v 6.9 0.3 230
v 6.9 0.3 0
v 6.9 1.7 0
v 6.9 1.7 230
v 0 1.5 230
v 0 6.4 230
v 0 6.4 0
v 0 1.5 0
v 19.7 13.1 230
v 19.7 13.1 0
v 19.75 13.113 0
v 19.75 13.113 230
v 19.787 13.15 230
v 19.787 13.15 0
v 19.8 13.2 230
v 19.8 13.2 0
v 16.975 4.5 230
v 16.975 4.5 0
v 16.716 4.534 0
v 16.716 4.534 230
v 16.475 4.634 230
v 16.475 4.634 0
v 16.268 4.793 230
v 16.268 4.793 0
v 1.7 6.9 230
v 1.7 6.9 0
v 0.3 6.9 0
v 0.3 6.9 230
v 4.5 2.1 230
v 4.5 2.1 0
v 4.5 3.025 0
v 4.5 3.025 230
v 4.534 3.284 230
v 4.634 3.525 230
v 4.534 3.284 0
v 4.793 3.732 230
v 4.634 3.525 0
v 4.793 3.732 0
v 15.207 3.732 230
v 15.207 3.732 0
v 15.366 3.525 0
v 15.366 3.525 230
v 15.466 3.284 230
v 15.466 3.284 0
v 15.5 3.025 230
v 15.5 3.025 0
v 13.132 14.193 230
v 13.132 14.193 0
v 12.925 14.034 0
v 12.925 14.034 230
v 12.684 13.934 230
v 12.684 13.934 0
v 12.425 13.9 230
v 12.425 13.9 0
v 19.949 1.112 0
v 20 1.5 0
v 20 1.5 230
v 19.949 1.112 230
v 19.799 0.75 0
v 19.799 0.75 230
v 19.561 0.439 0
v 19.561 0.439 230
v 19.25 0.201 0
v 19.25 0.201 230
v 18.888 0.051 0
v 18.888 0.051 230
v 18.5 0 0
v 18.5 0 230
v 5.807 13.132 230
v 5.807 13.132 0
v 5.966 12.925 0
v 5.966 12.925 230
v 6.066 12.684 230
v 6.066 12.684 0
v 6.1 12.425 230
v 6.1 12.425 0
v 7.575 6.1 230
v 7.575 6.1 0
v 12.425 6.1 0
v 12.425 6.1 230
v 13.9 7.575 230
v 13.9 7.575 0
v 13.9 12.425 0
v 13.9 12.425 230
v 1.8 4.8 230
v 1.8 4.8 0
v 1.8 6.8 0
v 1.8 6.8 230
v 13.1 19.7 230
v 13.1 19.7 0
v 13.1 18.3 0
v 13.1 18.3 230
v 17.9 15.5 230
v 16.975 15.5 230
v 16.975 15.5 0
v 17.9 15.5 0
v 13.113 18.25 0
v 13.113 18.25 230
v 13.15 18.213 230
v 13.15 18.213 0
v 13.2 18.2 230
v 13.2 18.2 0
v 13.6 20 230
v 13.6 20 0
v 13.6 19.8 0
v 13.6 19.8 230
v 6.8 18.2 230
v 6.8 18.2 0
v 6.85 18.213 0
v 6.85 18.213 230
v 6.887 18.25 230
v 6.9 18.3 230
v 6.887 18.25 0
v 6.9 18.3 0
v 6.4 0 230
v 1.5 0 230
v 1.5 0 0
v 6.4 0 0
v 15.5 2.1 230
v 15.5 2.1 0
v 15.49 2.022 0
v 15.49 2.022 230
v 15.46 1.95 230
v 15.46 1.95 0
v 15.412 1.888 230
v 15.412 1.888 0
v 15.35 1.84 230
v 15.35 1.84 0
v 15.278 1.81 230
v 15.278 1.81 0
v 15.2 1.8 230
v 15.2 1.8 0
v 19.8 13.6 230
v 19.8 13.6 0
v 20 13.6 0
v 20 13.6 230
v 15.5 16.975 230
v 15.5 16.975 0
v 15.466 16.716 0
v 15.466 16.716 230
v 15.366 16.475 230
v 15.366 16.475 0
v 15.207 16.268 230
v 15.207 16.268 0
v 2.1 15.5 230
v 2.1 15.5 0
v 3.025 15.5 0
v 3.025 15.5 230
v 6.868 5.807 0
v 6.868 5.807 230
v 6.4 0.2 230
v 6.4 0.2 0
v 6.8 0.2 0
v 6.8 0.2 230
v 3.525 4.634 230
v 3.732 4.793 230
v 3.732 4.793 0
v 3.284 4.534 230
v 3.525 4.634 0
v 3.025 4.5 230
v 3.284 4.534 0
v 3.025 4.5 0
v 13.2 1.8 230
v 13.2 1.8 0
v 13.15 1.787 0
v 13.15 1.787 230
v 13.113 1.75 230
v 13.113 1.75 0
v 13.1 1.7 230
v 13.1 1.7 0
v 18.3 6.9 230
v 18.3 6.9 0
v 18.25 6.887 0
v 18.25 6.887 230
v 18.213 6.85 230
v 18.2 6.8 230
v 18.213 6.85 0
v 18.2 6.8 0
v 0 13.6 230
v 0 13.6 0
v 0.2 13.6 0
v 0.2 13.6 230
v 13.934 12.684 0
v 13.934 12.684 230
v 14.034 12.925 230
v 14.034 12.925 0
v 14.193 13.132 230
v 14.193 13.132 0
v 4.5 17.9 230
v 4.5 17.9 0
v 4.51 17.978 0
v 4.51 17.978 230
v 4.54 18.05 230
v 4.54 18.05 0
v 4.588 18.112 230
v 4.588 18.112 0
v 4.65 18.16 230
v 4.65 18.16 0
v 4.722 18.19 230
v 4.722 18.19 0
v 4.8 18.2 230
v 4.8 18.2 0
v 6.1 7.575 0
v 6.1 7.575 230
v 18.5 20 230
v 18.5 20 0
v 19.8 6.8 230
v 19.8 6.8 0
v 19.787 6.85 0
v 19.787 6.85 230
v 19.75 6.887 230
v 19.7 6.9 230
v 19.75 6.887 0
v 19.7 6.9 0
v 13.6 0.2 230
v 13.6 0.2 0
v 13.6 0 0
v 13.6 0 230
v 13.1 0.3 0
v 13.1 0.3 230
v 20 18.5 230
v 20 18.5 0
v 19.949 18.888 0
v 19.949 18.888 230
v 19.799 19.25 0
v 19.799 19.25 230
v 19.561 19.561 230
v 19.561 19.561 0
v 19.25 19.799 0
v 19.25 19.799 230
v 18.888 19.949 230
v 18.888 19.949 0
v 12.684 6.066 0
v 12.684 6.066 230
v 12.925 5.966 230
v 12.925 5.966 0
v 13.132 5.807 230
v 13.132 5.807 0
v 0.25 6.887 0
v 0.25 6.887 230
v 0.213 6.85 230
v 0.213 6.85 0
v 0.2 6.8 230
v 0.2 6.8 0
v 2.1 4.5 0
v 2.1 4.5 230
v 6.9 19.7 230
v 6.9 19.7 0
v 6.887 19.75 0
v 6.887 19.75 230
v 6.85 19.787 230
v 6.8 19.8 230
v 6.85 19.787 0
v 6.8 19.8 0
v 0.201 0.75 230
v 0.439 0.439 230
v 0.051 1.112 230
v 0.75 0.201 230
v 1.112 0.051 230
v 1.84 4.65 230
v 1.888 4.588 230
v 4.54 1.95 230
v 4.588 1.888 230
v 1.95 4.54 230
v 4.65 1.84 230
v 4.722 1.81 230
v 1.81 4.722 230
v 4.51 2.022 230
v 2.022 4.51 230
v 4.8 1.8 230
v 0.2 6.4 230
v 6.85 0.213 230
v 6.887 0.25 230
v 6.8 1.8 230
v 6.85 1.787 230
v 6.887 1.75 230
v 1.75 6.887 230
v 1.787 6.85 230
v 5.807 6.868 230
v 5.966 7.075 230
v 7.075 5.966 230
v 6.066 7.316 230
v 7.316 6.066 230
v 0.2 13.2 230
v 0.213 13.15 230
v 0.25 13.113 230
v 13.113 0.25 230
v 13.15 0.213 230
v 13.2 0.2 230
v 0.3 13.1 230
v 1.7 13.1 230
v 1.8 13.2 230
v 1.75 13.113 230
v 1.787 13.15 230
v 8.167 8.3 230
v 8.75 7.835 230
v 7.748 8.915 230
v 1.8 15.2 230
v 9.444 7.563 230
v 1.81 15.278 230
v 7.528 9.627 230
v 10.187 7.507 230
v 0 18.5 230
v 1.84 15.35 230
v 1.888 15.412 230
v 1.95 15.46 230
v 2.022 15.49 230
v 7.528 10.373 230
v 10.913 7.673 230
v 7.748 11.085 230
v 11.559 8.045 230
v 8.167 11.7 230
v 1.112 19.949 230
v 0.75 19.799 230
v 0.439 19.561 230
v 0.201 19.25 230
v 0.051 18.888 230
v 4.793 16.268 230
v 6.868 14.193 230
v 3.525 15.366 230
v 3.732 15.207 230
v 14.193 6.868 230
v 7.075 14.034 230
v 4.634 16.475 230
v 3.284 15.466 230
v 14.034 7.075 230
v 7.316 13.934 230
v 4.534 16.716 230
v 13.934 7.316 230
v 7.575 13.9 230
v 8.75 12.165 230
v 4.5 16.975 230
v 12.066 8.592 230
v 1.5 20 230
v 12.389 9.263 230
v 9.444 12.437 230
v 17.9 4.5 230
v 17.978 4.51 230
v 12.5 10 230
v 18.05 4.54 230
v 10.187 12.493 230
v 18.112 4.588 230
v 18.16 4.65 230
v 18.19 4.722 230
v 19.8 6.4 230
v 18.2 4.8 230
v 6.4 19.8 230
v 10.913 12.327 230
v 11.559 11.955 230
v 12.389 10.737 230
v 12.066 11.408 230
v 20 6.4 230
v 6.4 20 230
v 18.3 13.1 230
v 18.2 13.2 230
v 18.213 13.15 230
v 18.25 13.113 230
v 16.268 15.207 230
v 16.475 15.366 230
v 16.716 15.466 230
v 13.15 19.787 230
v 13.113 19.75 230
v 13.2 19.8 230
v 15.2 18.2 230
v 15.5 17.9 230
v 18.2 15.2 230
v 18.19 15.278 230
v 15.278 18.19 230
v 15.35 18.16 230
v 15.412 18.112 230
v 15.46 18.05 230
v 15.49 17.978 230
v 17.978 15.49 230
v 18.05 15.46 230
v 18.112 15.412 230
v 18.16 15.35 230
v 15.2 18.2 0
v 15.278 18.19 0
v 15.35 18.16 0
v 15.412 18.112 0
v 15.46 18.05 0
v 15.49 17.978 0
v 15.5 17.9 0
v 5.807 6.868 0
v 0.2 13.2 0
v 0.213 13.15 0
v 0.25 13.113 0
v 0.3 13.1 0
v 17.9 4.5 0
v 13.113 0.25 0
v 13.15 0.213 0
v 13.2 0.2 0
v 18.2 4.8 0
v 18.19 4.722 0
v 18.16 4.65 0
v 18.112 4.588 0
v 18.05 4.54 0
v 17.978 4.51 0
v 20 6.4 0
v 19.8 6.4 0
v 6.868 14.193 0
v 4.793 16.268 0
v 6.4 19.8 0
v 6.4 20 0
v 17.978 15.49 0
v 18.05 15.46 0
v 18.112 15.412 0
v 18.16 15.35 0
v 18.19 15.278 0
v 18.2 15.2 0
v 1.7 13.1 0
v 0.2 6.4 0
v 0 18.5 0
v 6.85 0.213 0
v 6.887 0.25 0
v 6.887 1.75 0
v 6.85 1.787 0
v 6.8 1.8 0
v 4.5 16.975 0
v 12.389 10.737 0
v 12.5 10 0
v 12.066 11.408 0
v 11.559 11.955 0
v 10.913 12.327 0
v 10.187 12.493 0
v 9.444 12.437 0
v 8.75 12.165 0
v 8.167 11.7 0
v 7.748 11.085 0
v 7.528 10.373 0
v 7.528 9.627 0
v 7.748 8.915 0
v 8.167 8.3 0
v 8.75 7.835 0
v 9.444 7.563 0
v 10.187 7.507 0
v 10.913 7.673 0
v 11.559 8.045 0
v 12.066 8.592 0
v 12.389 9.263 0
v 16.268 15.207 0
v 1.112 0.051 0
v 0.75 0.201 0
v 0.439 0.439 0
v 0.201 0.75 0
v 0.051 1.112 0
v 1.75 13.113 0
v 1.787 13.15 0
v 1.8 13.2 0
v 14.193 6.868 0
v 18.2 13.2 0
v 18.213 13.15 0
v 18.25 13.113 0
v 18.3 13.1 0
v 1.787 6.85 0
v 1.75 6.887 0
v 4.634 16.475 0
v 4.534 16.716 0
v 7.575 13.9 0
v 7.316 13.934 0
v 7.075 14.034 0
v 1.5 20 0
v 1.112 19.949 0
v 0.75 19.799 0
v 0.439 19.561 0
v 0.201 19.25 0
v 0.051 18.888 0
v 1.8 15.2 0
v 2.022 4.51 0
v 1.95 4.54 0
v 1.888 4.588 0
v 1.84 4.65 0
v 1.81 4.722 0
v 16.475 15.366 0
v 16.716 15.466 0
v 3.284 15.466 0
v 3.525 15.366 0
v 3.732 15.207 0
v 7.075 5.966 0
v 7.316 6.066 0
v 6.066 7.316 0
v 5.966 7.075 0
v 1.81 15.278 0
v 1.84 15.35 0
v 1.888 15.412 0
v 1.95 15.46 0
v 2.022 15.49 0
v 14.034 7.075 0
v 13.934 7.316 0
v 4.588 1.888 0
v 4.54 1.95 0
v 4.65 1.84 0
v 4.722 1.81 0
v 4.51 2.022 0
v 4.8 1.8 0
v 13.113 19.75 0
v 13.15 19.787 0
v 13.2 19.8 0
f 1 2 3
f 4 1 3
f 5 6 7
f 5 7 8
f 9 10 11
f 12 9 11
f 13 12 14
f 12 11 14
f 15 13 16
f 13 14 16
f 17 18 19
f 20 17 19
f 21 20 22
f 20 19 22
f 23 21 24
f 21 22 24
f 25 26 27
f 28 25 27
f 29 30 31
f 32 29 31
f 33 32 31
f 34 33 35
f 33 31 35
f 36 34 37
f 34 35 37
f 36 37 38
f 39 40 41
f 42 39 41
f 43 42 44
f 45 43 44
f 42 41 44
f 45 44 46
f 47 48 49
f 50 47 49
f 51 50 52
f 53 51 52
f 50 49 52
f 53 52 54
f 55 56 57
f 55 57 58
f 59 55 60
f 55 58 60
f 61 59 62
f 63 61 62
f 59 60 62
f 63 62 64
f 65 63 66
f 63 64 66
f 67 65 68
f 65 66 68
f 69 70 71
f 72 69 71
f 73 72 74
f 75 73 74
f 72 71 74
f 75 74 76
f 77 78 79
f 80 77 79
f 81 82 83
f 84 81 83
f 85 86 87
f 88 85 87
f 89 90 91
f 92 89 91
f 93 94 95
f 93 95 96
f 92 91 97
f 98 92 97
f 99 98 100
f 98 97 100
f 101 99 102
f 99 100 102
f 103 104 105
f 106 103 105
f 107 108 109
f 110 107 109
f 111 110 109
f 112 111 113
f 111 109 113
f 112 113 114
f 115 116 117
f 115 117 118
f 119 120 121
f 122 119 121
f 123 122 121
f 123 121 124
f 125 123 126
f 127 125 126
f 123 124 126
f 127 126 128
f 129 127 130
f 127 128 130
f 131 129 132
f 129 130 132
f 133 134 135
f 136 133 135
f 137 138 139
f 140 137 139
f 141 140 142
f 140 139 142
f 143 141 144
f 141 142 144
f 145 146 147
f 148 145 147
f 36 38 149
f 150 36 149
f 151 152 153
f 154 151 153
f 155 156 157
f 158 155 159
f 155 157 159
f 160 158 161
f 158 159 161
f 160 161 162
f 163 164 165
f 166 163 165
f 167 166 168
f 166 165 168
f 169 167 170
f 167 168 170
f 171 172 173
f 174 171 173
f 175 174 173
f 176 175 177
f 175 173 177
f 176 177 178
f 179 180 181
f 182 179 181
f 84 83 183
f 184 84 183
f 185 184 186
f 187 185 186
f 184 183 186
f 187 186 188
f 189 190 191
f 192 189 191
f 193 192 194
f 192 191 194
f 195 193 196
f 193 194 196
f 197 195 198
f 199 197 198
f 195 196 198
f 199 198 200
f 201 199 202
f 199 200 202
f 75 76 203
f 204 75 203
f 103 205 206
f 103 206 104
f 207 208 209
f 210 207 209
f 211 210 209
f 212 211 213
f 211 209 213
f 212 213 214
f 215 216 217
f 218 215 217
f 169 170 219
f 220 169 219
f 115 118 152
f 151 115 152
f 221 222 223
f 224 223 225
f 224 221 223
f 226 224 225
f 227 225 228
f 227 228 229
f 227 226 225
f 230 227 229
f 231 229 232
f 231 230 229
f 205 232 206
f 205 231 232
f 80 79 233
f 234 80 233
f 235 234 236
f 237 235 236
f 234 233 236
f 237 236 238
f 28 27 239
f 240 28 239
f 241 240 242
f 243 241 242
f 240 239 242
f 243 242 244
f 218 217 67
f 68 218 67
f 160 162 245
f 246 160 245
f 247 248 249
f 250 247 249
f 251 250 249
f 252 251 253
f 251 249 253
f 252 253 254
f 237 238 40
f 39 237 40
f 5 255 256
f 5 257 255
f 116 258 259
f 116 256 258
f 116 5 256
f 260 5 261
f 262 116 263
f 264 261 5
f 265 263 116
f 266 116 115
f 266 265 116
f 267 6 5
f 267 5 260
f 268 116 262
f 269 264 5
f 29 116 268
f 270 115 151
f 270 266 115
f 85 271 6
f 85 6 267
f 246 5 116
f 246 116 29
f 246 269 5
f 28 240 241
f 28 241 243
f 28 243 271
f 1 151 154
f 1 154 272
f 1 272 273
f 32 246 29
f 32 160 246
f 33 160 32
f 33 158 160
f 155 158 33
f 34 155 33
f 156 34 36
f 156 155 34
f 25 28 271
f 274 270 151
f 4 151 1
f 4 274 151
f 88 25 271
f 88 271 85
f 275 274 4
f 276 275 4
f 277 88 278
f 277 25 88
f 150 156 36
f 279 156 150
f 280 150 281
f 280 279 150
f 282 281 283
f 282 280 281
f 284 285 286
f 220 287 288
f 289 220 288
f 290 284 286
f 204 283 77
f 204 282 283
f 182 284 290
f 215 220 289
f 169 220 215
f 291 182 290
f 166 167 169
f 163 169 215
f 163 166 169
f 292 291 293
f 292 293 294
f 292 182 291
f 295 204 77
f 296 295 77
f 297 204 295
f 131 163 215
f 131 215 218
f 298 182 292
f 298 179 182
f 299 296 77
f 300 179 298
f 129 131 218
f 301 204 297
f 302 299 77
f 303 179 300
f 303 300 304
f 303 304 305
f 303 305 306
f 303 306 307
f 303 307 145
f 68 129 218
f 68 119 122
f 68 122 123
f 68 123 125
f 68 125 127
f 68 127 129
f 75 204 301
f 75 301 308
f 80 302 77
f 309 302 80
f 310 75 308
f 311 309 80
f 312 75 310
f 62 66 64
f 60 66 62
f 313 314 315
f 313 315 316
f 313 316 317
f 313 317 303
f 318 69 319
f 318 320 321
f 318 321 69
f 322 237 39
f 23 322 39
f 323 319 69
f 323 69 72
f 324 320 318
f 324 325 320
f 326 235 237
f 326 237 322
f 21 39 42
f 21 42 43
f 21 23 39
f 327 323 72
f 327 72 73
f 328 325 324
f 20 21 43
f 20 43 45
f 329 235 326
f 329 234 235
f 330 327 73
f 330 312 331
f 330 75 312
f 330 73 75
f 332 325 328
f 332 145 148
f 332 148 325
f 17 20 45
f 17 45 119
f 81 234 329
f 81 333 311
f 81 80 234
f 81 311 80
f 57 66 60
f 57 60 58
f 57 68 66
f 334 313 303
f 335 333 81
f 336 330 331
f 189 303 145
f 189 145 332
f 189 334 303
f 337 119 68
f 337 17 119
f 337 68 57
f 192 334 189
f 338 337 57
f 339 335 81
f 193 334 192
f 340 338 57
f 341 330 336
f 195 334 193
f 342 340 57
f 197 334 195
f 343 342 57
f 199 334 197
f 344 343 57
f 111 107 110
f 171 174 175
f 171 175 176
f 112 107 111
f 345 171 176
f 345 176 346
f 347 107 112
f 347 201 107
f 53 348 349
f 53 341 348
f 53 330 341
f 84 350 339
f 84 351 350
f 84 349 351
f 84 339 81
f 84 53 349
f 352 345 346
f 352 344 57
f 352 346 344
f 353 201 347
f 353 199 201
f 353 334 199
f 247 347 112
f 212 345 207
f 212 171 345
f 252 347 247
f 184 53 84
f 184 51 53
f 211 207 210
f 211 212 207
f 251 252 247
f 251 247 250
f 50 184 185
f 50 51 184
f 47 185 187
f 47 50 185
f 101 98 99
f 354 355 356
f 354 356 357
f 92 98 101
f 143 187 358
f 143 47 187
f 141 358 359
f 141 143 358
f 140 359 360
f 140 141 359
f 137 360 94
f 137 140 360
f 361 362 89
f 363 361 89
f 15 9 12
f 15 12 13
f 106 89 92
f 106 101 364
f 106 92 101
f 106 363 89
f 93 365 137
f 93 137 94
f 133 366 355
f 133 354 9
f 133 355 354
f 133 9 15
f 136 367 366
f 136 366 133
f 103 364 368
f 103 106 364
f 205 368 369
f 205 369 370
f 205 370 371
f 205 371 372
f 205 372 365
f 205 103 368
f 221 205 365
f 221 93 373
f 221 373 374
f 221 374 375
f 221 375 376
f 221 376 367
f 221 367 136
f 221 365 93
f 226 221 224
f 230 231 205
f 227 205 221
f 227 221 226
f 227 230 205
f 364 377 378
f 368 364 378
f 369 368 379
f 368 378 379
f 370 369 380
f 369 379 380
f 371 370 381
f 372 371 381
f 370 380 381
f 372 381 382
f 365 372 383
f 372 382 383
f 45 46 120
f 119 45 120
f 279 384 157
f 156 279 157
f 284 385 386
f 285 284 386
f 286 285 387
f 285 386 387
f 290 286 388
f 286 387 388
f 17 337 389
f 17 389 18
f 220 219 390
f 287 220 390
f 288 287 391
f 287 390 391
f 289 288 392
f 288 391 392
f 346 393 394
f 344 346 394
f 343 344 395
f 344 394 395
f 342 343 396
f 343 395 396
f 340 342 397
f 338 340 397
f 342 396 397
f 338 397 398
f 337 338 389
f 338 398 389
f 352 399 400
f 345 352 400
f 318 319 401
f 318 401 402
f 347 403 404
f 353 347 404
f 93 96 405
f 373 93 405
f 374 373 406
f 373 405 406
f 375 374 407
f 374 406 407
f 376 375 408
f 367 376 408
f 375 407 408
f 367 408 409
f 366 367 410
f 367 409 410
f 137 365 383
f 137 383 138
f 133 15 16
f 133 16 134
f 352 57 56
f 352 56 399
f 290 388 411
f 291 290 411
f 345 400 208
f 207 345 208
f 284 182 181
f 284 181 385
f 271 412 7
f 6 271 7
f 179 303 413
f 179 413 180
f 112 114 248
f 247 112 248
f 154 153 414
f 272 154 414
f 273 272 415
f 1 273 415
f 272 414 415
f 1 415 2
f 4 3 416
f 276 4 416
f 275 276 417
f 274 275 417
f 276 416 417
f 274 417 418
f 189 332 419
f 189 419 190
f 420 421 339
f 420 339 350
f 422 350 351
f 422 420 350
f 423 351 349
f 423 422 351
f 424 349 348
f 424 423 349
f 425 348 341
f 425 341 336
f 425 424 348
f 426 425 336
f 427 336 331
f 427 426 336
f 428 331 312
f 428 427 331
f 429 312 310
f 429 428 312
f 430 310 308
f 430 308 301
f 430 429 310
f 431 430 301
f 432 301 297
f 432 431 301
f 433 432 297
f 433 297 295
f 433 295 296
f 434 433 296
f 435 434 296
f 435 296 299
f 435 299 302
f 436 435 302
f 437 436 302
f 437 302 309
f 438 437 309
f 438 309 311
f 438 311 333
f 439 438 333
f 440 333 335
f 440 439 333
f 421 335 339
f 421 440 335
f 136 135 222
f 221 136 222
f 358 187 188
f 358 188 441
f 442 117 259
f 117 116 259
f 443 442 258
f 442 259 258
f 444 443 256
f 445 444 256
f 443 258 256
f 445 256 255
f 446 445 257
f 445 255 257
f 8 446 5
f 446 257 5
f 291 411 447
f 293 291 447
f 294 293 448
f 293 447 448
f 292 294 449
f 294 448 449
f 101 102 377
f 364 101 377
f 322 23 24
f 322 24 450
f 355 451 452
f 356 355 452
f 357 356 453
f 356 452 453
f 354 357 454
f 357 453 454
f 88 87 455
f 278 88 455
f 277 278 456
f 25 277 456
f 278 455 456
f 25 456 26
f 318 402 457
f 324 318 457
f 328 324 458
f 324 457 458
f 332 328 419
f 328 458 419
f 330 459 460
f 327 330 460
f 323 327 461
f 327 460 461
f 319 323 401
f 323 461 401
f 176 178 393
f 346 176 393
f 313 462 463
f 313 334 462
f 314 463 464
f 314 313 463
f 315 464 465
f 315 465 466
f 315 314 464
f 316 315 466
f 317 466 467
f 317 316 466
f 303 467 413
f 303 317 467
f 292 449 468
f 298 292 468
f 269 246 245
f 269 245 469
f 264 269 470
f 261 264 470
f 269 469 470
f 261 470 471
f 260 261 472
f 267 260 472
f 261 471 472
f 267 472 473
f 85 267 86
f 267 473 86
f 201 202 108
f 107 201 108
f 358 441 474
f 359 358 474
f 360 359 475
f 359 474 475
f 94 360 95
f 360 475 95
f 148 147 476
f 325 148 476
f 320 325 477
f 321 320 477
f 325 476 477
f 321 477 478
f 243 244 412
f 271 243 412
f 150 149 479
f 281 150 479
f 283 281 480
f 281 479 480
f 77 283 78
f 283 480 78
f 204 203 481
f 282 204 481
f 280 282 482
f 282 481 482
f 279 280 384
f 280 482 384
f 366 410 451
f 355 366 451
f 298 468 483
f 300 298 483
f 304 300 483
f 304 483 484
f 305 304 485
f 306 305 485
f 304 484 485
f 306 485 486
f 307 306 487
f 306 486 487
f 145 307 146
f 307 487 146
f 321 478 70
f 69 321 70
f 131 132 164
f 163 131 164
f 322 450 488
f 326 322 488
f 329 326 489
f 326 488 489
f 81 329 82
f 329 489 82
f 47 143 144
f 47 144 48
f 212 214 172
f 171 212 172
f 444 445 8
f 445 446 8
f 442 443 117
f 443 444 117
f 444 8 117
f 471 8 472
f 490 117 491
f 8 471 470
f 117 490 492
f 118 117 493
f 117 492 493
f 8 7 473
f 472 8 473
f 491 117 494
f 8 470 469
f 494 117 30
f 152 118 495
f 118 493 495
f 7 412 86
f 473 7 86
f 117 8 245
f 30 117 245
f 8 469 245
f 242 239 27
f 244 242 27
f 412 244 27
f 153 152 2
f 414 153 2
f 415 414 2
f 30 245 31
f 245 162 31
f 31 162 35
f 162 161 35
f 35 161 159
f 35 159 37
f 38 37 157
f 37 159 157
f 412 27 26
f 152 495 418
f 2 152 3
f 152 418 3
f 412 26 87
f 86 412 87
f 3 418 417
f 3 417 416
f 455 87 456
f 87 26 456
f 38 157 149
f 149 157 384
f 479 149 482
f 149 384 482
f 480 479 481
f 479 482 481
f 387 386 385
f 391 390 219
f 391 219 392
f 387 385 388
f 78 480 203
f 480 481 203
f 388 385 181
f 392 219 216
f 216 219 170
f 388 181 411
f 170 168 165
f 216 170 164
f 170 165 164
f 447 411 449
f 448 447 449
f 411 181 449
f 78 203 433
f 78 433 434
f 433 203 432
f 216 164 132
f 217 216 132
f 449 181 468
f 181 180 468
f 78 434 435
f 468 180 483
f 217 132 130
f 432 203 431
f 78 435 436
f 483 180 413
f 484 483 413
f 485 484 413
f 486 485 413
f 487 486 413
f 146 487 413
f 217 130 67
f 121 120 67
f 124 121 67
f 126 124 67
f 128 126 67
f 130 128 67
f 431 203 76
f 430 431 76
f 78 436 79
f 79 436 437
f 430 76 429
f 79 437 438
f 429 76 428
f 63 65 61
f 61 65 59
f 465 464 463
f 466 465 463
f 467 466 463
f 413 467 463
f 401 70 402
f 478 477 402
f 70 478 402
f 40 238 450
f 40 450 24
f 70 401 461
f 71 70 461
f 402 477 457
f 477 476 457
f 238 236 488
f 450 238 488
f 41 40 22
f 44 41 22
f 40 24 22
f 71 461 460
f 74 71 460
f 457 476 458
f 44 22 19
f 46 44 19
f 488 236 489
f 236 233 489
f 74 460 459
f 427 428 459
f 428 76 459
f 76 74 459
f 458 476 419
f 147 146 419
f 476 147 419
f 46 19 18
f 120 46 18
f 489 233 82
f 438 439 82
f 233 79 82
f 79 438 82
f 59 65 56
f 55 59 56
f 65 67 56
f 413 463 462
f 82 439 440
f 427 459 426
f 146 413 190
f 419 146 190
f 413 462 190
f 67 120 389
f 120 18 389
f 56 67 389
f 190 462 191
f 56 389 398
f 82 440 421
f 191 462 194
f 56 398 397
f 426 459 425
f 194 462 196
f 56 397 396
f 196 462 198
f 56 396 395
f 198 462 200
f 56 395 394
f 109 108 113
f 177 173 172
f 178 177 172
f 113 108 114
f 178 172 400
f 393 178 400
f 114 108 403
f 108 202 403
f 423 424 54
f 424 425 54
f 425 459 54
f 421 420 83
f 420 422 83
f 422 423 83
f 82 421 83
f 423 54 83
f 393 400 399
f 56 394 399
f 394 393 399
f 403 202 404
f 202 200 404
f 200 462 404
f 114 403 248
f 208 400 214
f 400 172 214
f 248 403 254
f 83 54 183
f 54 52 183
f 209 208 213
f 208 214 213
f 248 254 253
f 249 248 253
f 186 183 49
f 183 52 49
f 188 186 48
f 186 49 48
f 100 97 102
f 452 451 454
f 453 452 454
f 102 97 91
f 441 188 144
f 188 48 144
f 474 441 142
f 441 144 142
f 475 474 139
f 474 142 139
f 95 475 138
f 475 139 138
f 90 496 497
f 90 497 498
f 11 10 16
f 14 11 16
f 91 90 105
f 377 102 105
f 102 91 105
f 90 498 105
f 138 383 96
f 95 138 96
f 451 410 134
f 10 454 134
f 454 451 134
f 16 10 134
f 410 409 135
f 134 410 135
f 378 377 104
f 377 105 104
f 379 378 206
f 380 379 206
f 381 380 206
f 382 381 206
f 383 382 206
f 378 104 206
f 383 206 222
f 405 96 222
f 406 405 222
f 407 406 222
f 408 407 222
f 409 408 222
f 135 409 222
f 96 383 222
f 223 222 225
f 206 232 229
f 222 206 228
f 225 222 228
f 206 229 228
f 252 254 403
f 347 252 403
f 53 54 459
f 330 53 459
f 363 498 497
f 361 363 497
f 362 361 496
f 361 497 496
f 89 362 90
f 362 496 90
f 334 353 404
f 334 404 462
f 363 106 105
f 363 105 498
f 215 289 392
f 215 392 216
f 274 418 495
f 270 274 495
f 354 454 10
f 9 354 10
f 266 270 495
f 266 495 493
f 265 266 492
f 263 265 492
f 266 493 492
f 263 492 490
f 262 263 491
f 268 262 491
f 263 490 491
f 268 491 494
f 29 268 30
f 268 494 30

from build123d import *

# Parameters (mm, degrees)
SKETCH_1_R      = 2.5
EXTRUDE_1_DEPTH = 230
FILLET_1_R      = 1.5


with BuildPart() as part:
    # 草图1 → 凸台-拉伸1 (new body)
    with BuildSketch(Plane.XY):
        with BuildLine():
            Line((20, 13.6), (20, 20))
            Line((20, 20), (13.6, 20))
            Line((13.6, 20), (13.6, 19.8))
            Line((13.6, 19.8), (13.2, 19.8))
            ThreePointArc((13.2, 19.8), (13.129289322, 19.770710678), (13.1, 19.7))
            Line((13.1, 19.7), (13.1, 18.3))
            ThreePointArc((13.1, 18.3), (13.129289322, 18.229289322), (13.2, 18.2))
            Line((13.2, 18.2), (15.2, 18.2))
            ThreePointArc((15.2, 18.2), (15.412132034, 18.112132034), (15.5, 17.9))
            Line((15.5, 17.9), (15.5, 16.974873734))
            ThreePointArc((15.5, 16.974873734), (15.423879533, 16.592190302), (15.207106781, 16.267766953))
            Line((15.207106781, 16.267766953), (13.132233047, 14.192893219))
            ThreePointArc((13.132233047, 14.192893219), (12.807809698, 13.976120467), (12.425126266, 13.9))
            Line((12.425126266, 13.9), (7.574873734, 13.9))
            ThreePointArc((7.574873734, 13.9), (7.192190302, 13.976120467), (6.867766953, 14.192893219))
            Line((6.867766953, 14.192893219), (4.792893219, 16.267766953))
            ThreePointArc((4.792893219, 16.267766953), (4.576120467, 16.592190302), (4.5, 16.974873734))
            Line((4.5, 16.974873734), (4.5, 17.9))
            ThreePointArc((4.5, 17.9), (4.587867966, 18.112132034), (4.8, 18.2))
            Line((4.8, 18.2), (6.8, 18.2))
            ThreePointArc((6.8, 18.2), (6.870710678, 18.229289322), (6.9, 18.3))
            Line((6.9, 18.3), (6.9, 19.7))
            ThreePointArc((6.9, 19.7), (6.870710678, 19.770710678), (6.8, 19.8))
            Line((6.8, 19.8), (6.4, 19.8))
            Line((6.4, 19.8), (6.4, 20))
            Line((6.4, 20), (0, 20))
            Line((0, 20), (0, 13.6))
            Line((0, 13.6), (0.2, 13.6))
            Line((0.2, 13.6), (0.2, 13.2))
            ThreePointArc((0.2, 13.2), (0.229289322, 13.129289322), (0.3, 13.1))
            Line((0.3, 13.1), (1.7, 13.1))
            ThreePointArc((1.7, 13.1), (1.770710678, 13.129289322), (1.8, 13.2))
            Line((1.8, 13.2), (1.8, 15.2))
            ThreePointArc((1.8, 15.2), (1.887867966, 15.412132034), (2.1, 15.5))
            Line((2.1, 15.5), (3.025126266, 15.5))
            ThreePointArc((3.025126266, 15.5), (3.407809698, 15.423879533), (3.732233047, 15.207106781))
            Line((3.732233047, 15.207106781), (5.807106781, 13.132233047))
            ThreePointArc((5.807106781, 13.132233047), (6.023879533, 12.807809698), (6.1, 12.425126266))
            Line((6.1, 12.425126266), (6.1, 7.574873734))
            ThreePointArc((6.1, 7.574873734), (6.023879533, 7.192190302), (5.807106781, 6.867766953))
            Line((5.807106781, 6.867766953), (3.732233047, 4.792893219))
            ThreePointArc((3.732233047, 4.792893219), (3.407809698, 4.576120467), (3.025126266, 4.5))
            Line((3.025126266, 4.5), (2.1, 4.5))
            ThreePointArc((2.1, 4.5), (1.887867966, 4.587867966), (1.8, 4.8))
            Line((1.8, 4.8), (1.8, 6.8))
            ThreePointArc((1.8, 6.8), (1.770710678, 6.870710678), (1.7, 6.9))
            Line((1.7, 6.9), (0.3, 6.9))
            ThreePointArc((0.3, 6.9), (0.229289322, 6.870710678), (0.2, 6.8))
            Line((0.2, 6.8), (0.2, 6.4))
            Line((0.2, 6.4), (0, 6.4))
            Line((0, 6.4), (0, 0))
            Line((0, 0), (6.4, 0))
            Line((6.4, 0), (6.4, 0.2))
            Line((6.4, 0.2), (6.8, 0.2))
            ThreePointArc((6.8, 0.2), (6.870710678, 0.229289322), (6.9, 0.3))
            Line((6.9, 0.3), (6.9, 1.7))
            ThreePointArc((6.9, 1.7), (6.870710678, 1.770710678), (6.8, 1.8))
            Line((6.8, 1.8), (4.8, 1.8))
            ThreePointArc((4.8, 1.8), (4.587867966, 1.887867966), (4.5, 2.1))
            Line((4.5, 2.1), (4.5, 3.025126266))
            ThreePointArc((4.5, 3.025126266), (4.576120467, 3.407809698), (4.792893219, 3.732233047))
            Line((4.792893219, 3.732233047), (6.867766953, 5.807106781))
            ThreePointArc((6.867766953, 5.807106781), (7.192190302, 6.023879533), (7.574873734, 6.1))
            Line((7.574873734, 6.1), (12.425126266, 6.1))
            ThreePointArc((12.425126266, 6.1), (12.807809698, 6.023879533), (13.132233047, 5.807106781))
            Line((13.132233047, 5.807106781), (15.207106781, 3.732233047))
            ThreePointArc((15.207106781, 3.732233047), (15.423879533, 3.407809698), (15.5, 3.025126266))
            Line((15.5, 3.025126266), (15.5, 2.1))
            ThreePointArc((15.5, 2.1), (15.412132034, 1.887867966), (15.2, 1.8))
            Line((15.2, 1.8), (13.2, 1.8))
            ThreePointArc((13.2, 1.8), (13.129289322, 1.770710678), (13.1, 1.7))
            Line((13.1, 1.7), (13.1, 0.3))
            ThreePointArc((13.1, 0.3), (13.129289322, 0.229289322), (13.2, 0.2))
            Line((13.2, 0.2), (13.6, 0.2))
            Line((13.6, 0.2), (13.6, 0))
            Line((13.6, 0), (20, 0))
            Line((20, 0), (20, 6.4))
            Line((20, 6.4), (19.8, 6.4))
            Line((19.8, 6.4), (19.8, 6.8))
            ThreePointArc((19.8, 6.8), (19.770710678, 6.870710678), (19.7, 6.9))
            Line((19.7, 6.9), (18.3, 6.9))
            ThreePointArc((18.3, 6.9), (18.229289322, 6.870710678), (18.2, 6.8))
            Line((18.2, 6.8), (18.2, 4.8))
            ThreePointArc((18.2, 4.8), (18.112132034, 4.587867966), (17.9, 4.5))
            Line((17.9, 4.5), (16.974873734, 4.5))
            ThreePointArc((16.974873734, 4.5), (16.592190302, 4.576120467), (16.267766953, 4.792893219))
            Line((16.267766953, 4.792893219), (14.192893219, 6.867766953))
            ThreePointArc((14.192893219, 6.867766953), (13.976120467, 7.192190302), (13.9, 7.574873734))
            Line((13.9, 7.574873734), (13.9, 12.425126266))
            ThreePointArc((13.9, 12.425126266), (13.976120467, 12.807809698), (14.192893219, 13.132233047))
            Line((14.192893219, 13.132233047), (16.267766953, 15.207106781))
            ThreePointArc((16.267766953, 15.207106781), (16.592190302, 15.423879533), (16.974873734, 15.5))
            Line((16.974873734, 15.5), (17.9, 15.5))
            ThreePointArc((17.9, 15.5), (18.112132034, 15.412132034), (18.2, 15.2))
            Line((18.2, 15.2), (18.2, 13.2))
            ThreePointArc((18.2, 13.2), (18.229289322, 13.129289322), (18.3, 13.1))
            Line((18.3, 13.1), (19.7, 13.1))
            ThreePointArc((19.7, 13.1), (19.770710678, 13.129289322), (19.8, 13.2))
            Line((19.8, 13.2), (19.8, 13.6))
            Line((19.8, 13.6), (20, 13.6))
        make_face()
        with Locations((10, 10)):
            Circle(SKETCH_1_R, mode=Mode.SUBTRACT)
    extrude(amount=EXTRUDE_1_DEPTH)

    # 圆角1
    fillet_1_edges = [part.edges().sort_by_distance(p)[0] for p in [
        (0, 0, 115),
        (0, 20, 115),
        (20, 20, 115),
        (20, 0, 115),
    ]]
    fillet(fillet_1_edges, radius=FILLET_1_R)


solid = part.part
